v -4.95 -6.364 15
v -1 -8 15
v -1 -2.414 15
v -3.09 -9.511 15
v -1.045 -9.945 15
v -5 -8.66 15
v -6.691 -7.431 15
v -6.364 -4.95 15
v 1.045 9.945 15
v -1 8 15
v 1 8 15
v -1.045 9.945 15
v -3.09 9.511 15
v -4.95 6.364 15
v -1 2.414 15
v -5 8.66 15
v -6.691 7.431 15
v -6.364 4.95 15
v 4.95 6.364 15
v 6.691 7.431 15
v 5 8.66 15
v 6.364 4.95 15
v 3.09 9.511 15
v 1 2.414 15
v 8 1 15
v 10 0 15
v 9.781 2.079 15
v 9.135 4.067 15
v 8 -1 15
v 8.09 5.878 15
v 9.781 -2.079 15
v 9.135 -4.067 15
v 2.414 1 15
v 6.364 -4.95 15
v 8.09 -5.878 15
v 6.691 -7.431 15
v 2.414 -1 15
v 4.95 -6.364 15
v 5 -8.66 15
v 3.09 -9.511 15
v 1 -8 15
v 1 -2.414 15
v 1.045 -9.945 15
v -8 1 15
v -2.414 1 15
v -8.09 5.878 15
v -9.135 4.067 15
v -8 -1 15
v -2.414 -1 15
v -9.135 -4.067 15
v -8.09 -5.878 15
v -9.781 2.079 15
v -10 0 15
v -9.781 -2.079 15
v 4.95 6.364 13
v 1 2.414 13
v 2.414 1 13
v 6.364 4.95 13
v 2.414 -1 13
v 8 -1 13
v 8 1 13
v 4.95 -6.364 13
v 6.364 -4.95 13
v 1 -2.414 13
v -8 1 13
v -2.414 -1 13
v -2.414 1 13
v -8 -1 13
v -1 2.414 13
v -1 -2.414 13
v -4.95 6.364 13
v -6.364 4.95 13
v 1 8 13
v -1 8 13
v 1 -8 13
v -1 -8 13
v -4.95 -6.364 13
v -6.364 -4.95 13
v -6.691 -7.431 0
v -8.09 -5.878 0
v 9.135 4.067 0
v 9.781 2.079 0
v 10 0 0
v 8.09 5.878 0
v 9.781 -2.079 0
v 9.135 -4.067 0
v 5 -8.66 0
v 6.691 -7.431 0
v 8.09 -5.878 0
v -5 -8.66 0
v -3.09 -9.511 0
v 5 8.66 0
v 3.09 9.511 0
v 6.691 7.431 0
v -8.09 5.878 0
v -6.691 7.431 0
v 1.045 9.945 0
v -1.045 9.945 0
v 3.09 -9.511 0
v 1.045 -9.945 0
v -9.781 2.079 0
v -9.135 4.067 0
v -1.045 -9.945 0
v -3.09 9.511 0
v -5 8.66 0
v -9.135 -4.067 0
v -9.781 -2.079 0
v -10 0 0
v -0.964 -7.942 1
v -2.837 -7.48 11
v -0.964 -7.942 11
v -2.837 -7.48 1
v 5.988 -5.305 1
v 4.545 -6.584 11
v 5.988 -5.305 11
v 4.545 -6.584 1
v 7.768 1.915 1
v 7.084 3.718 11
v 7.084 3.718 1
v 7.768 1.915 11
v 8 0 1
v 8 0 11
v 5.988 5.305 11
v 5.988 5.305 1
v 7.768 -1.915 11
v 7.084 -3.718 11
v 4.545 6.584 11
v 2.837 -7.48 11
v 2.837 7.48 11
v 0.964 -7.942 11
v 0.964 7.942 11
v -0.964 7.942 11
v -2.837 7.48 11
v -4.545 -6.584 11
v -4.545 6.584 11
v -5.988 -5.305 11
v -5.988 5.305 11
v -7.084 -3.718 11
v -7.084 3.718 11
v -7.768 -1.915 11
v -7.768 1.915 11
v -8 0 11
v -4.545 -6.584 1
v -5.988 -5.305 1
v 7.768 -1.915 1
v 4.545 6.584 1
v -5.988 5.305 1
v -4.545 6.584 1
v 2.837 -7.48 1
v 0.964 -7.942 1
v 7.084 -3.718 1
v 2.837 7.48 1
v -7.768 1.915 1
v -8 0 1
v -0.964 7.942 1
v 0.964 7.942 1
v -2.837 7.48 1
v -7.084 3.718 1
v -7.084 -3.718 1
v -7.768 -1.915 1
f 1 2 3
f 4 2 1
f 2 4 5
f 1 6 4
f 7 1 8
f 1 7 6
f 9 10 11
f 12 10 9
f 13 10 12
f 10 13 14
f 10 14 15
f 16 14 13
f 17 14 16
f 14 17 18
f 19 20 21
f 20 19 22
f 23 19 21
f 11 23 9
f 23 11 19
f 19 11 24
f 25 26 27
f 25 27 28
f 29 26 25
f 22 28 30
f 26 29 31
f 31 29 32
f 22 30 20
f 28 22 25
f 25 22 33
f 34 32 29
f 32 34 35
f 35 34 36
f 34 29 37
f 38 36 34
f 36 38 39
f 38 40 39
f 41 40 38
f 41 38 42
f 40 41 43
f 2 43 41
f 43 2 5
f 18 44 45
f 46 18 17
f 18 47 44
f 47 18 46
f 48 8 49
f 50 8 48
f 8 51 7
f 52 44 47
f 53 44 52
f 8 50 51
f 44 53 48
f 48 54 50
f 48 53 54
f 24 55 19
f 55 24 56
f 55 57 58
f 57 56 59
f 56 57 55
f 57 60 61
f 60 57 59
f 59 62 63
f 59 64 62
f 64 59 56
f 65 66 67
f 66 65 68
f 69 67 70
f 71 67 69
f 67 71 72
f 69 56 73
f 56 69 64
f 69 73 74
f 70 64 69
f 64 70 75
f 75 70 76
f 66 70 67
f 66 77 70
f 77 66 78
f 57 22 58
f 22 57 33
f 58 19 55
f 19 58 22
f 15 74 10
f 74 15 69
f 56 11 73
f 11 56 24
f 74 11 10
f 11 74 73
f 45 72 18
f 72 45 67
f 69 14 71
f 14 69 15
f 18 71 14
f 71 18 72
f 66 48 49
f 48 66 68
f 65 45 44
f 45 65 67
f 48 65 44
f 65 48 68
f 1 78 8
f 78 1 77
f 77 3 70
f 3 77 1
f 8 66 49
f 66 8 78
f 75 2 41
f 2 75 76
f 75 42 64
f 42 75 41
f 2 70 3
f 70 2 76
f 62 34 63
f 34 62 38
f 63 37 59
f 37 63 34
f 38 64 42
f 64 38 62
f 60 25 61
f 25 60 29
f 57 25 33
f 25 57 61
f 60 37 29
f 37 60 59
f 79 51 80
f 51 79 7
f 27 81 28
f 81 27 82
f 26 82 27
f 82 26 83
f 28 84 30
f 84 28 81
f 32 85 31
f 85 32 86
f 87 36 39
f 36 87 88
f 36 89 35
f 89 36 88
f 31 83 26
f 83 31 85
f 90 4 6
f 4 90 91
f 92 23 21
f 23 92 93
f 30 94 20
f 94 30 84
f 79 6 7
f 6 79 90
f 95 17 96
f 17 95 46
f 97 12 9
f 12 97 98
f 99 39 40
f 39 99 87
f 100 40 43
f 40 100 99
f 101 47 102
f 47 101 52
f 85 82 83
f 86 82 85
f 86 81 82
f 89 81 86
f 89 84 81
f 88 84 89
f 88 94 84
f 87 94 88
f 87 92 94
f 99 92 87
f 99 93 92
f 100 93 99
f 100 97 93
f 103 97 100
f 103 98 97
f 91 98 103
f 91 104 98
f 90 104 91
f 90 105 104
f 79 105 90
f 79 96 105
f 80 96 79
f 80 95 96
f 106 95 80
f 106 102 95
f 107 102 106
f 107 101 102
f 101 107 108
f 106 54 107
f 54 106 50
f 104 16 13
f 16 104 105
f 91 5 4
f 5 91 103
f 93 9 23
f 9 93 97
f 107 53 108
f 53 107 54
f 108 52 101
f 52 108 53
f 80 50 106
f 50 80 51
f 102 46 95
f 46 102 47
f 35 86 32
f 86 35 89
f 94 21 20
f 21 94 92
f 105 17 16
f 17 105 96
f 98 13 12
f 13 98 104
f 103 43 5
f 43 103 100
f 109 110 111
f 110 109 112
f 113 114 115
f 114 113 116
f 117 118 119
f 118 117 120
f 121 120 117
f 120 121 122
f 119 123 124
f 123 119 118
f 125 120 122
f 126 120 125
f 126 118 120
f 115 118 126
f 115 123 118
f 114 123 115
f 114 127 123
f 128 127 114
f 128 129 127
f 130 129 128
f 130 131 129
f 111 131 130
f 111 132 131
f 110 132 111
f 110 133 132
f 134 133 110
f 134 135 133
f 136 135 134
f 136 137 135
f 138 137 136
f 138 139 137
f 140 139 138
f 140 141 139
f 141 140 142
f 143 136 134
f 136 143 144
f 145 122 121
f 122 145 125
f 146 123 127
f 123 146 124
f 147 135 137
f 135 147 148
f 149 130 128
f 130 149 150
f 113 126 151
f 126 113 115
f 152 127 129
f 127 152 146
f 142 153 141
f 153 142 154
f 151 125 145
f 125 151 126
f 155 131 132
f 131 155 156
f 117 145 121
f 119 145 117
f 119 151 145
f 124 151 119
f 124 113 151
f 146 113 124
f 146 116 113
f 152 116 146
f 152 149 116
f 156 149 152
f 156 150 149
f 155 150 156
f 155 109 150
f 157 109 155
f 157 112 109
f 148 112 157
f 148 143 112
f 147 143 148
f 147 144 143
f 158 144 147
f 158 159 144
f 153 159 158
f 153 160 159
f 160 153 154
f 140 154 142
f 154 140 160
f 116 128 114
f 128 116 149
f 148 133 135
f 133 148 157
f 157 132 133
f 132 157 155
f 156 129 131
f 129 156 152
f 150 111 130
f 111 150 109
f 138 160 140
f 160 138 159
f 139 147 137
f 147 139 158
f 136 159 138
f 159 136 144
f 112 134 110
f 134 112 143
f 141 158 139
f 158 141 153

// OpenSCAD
difference() {
    difference() {
        color( "DarkRed", 1.0) cylinder( h=15, r=10);

        for(a=[1:8]) {
            rotate([0,0,a*45]) {
                translate([0, -1, 13]) {
                    color("White", 1.0) cube([8,2,2]);
                }
            }
        }
    }
    
    translate([0,0,1]) {
        color("Black", 1.0) cylinder(h=10, r=8);
    }
}
